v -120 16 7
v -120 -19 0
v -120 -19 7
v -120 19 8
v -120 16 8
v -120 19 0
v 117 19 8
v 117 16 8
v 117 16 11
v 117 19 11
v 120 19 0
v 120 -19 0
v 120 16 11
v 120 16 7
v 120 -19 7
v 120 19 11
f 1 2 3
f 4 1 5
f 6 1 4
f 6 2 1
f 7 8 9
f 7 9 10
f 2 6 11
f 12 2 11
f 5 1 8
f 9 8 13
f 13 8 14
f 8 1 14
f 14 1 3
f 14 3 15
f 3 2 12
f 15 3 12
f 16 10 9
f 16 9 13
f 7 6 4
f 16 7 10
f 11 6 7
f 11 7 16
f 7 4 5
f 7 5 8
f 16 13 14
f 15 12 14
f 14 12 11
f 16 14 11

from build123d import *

# Parameters (mm, degrees)
F1_W     = 240
F1_H     = 38
F2_DEPTH = 8
F3_W     = 240
F3_H     = 35
F4_DEPTH = 1
F5_W     = 3
F5_H     = 3
F6_DEPTH = 3


with BuildPart() as f2:
    # F1 (on Top) → F2 (new body)
    with BuildSketch(Plane.XY):
        Rectangle(F1_W, F1_H)
    extrude(amount=F2_DEPTH)

    # F3 (on face) → F4 (cut)
    with BuildSketch(Plane.XY.offset(8)):
        with Locations((0, -1.5)):
            Rectangle(F3_W, F3_H)
    extrude(amount=-F4_DEPTH, mode=Mode.SUBTRACT)

    # F5 (on face) → F6 (join)
    with BuildSketch(Plane.XY.offset(8)):
        with Locations((118.5, 17.5)):
            Rectangle(F5_W, F5_H)
    extrude(amount=F6_DEPTH)


solid = f2.part
